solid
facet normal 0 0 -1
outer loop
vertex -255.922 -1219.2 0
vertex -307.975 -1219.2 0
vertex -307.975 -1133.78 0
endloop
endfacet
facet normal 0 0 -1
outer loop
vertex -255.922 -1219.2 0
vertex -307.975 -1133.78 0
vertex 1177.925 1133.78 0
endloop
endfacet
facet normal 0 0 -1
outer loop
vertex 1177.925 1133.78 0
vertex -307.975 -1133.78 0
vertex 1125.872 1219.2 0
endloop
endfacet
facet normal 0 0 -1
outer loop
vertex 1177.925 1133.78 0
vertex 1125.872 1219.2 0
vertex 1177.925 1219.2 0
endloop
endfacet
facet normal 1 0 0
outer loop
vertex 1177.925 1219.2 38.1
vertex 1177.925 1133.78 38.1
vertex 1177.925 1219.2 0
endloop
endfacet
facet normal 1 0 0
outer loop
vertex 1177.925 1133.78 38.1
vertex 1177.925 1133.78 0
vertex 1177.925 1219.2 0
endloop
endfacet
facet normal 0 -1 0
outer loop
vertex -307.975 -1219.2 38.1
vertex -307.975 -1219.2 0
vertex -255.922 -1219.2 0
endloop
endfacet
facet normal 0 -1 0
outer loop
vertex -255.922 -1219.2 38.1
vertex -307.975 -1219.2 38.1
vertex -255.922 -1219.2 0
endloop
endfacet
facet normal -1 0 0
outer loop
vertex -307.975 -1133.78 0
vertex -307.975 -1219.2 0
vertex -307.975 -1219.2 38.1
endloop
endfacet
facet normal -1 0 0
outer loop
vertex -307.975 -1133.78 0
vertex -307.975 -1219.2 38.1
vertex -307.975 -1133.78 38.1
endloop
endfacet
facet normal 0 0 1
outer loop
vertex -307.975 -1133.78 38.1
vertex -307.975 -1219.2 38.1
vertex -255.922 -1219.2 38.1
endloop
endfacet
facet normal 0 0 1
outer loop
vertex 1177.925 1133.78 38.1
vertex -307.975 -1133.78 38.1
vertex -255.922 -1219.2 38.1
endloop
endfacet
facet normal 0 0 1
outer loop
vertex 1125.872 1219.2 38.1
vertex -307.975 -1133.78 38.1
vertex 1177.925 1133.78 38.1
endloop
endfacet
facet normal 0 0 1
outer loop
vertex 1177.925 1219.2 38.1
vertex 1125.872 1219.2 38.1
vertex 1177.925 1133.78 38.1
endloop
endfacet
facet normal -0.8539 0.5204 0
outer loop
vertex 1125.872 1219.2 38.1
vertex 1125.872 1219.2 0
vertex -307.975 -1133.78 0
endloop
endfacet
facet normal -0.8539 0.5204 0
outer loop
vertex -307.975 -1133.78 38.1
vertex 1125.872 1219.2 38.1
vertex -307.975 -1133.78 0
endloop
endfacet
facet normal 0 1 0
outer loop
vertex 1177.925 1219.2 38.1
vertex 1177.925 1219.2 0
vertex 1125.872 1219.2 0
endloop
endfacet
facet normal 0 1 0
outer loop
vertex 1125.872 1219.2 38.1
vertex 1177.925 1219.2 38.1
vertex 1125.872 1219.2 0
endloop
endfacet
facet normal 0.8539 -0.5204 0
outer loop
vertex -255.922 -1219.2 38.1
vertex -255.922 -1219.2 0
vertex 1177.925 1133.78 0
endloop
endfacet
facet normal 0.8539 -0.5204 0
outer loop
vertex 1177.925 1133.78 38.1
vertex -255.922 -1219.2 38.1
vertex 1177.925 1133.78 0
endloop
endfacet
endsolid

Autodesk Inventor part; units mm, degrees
ref_plane "YZ Plane" through (0, 0, 0) normal (1, 0, 0) x (0, 1, 0)
ref_plane "XZ Plane" through (0, 0, 0) normal (0, 1, 0) x (-1, 0, 0)
ref_plane "XY Plane" through (0, 0, 0) normal (0, 0, 1) x (1, 0, 0)
sketch "Sketch1" plane through (0, 0, 0) normal (0, 0, 1) x (1, 0, 0)
  line L0 (-1177.925, -1219.2) -> (1177.925, -1219.2)
  line L1 (1177.925, -1219.2) -> (1177.925, 1219.2)
  line L2 (1177.925, 1219.2) -> (-1177.925, 1219.2)
  line L3 (-1177.925, 1219.2) -> (-1177.925, -1219.2)
  line L4 (-1177.925, -1219.2) -> (1177.925, 1219.2) construction
  line L5 (1177.925, -1219.2) -> (-1177.925, 1219.2) construction
  line L6 (-1177.925, -1219.2) -> (-307.975, -1219.2)
  line L7 (-307.975, -1219.2) -> (-307.975, 1219.2)
  line L8 (1177.925, 1219.2) -> (-307.975, -1219.2)
  line L9 (-1177.925, 1219.2) -> (-307.975, -1219.2)
  line L10 (-345.9327, -1196.0695) -> (-270.0173, -1242.3305)
  line L11 (-349.8404, -1234.1363) -> (-266.1096, -1204.2637)
  line L12 (-1219.7904, 1204.2637) -> (-1136.0596, 1234.1363)
  line L13 (1215.8827, 1196.0695) -> (1139.9673, 1242.3305)
  line L14 (1139.9673, 1242.3305) -> (-345.9327, -1196.0695)
  line L15 (-270.0173, -1242.3305) -> (1215.8827, 1196.0695)
  line L16 (-266.1096, -1204.2637) -> (-1136.0596, 1234.1363)
  line L17 (-1219.7904, 1204.2637) -> (-349.8404, -1234.1363)
  point P0 (0, 0)
  point P1 (-307.975, -1086.9184)
  point P2 (-1130.7308, 1219.2)
  point P3 (-1177.925, 1086.9184)
  point P4 (-355.1692, -1219.2)
  point P5 (-307.975, -1219.2)
  point P6 (-307.975, -1133.78)
  point P7 (1125.8722, 1219.2)
  point P8 (-255.9222, -1219.2)
  point P9 (1177.925, 1133.78)
  dimension "d0" = 2355.85
  dimension "d1" = 2438.4
  dimension "d2" = 869.95
  dimension "d3" = 88.9
  dimension "d4" = 88.9
  dimension "d6" = 88.9
  dimension "d7" = 88.9
extrude "Extrusion1" add sketch "Sketch1" along normal blind 38.1 contours L11 L16 L8 L1 L15 L0 | L7 L14 L16 L8 | L8 L16 L11 | L16 L14 L2 L8
properties part number "S_2x4x112.420"
